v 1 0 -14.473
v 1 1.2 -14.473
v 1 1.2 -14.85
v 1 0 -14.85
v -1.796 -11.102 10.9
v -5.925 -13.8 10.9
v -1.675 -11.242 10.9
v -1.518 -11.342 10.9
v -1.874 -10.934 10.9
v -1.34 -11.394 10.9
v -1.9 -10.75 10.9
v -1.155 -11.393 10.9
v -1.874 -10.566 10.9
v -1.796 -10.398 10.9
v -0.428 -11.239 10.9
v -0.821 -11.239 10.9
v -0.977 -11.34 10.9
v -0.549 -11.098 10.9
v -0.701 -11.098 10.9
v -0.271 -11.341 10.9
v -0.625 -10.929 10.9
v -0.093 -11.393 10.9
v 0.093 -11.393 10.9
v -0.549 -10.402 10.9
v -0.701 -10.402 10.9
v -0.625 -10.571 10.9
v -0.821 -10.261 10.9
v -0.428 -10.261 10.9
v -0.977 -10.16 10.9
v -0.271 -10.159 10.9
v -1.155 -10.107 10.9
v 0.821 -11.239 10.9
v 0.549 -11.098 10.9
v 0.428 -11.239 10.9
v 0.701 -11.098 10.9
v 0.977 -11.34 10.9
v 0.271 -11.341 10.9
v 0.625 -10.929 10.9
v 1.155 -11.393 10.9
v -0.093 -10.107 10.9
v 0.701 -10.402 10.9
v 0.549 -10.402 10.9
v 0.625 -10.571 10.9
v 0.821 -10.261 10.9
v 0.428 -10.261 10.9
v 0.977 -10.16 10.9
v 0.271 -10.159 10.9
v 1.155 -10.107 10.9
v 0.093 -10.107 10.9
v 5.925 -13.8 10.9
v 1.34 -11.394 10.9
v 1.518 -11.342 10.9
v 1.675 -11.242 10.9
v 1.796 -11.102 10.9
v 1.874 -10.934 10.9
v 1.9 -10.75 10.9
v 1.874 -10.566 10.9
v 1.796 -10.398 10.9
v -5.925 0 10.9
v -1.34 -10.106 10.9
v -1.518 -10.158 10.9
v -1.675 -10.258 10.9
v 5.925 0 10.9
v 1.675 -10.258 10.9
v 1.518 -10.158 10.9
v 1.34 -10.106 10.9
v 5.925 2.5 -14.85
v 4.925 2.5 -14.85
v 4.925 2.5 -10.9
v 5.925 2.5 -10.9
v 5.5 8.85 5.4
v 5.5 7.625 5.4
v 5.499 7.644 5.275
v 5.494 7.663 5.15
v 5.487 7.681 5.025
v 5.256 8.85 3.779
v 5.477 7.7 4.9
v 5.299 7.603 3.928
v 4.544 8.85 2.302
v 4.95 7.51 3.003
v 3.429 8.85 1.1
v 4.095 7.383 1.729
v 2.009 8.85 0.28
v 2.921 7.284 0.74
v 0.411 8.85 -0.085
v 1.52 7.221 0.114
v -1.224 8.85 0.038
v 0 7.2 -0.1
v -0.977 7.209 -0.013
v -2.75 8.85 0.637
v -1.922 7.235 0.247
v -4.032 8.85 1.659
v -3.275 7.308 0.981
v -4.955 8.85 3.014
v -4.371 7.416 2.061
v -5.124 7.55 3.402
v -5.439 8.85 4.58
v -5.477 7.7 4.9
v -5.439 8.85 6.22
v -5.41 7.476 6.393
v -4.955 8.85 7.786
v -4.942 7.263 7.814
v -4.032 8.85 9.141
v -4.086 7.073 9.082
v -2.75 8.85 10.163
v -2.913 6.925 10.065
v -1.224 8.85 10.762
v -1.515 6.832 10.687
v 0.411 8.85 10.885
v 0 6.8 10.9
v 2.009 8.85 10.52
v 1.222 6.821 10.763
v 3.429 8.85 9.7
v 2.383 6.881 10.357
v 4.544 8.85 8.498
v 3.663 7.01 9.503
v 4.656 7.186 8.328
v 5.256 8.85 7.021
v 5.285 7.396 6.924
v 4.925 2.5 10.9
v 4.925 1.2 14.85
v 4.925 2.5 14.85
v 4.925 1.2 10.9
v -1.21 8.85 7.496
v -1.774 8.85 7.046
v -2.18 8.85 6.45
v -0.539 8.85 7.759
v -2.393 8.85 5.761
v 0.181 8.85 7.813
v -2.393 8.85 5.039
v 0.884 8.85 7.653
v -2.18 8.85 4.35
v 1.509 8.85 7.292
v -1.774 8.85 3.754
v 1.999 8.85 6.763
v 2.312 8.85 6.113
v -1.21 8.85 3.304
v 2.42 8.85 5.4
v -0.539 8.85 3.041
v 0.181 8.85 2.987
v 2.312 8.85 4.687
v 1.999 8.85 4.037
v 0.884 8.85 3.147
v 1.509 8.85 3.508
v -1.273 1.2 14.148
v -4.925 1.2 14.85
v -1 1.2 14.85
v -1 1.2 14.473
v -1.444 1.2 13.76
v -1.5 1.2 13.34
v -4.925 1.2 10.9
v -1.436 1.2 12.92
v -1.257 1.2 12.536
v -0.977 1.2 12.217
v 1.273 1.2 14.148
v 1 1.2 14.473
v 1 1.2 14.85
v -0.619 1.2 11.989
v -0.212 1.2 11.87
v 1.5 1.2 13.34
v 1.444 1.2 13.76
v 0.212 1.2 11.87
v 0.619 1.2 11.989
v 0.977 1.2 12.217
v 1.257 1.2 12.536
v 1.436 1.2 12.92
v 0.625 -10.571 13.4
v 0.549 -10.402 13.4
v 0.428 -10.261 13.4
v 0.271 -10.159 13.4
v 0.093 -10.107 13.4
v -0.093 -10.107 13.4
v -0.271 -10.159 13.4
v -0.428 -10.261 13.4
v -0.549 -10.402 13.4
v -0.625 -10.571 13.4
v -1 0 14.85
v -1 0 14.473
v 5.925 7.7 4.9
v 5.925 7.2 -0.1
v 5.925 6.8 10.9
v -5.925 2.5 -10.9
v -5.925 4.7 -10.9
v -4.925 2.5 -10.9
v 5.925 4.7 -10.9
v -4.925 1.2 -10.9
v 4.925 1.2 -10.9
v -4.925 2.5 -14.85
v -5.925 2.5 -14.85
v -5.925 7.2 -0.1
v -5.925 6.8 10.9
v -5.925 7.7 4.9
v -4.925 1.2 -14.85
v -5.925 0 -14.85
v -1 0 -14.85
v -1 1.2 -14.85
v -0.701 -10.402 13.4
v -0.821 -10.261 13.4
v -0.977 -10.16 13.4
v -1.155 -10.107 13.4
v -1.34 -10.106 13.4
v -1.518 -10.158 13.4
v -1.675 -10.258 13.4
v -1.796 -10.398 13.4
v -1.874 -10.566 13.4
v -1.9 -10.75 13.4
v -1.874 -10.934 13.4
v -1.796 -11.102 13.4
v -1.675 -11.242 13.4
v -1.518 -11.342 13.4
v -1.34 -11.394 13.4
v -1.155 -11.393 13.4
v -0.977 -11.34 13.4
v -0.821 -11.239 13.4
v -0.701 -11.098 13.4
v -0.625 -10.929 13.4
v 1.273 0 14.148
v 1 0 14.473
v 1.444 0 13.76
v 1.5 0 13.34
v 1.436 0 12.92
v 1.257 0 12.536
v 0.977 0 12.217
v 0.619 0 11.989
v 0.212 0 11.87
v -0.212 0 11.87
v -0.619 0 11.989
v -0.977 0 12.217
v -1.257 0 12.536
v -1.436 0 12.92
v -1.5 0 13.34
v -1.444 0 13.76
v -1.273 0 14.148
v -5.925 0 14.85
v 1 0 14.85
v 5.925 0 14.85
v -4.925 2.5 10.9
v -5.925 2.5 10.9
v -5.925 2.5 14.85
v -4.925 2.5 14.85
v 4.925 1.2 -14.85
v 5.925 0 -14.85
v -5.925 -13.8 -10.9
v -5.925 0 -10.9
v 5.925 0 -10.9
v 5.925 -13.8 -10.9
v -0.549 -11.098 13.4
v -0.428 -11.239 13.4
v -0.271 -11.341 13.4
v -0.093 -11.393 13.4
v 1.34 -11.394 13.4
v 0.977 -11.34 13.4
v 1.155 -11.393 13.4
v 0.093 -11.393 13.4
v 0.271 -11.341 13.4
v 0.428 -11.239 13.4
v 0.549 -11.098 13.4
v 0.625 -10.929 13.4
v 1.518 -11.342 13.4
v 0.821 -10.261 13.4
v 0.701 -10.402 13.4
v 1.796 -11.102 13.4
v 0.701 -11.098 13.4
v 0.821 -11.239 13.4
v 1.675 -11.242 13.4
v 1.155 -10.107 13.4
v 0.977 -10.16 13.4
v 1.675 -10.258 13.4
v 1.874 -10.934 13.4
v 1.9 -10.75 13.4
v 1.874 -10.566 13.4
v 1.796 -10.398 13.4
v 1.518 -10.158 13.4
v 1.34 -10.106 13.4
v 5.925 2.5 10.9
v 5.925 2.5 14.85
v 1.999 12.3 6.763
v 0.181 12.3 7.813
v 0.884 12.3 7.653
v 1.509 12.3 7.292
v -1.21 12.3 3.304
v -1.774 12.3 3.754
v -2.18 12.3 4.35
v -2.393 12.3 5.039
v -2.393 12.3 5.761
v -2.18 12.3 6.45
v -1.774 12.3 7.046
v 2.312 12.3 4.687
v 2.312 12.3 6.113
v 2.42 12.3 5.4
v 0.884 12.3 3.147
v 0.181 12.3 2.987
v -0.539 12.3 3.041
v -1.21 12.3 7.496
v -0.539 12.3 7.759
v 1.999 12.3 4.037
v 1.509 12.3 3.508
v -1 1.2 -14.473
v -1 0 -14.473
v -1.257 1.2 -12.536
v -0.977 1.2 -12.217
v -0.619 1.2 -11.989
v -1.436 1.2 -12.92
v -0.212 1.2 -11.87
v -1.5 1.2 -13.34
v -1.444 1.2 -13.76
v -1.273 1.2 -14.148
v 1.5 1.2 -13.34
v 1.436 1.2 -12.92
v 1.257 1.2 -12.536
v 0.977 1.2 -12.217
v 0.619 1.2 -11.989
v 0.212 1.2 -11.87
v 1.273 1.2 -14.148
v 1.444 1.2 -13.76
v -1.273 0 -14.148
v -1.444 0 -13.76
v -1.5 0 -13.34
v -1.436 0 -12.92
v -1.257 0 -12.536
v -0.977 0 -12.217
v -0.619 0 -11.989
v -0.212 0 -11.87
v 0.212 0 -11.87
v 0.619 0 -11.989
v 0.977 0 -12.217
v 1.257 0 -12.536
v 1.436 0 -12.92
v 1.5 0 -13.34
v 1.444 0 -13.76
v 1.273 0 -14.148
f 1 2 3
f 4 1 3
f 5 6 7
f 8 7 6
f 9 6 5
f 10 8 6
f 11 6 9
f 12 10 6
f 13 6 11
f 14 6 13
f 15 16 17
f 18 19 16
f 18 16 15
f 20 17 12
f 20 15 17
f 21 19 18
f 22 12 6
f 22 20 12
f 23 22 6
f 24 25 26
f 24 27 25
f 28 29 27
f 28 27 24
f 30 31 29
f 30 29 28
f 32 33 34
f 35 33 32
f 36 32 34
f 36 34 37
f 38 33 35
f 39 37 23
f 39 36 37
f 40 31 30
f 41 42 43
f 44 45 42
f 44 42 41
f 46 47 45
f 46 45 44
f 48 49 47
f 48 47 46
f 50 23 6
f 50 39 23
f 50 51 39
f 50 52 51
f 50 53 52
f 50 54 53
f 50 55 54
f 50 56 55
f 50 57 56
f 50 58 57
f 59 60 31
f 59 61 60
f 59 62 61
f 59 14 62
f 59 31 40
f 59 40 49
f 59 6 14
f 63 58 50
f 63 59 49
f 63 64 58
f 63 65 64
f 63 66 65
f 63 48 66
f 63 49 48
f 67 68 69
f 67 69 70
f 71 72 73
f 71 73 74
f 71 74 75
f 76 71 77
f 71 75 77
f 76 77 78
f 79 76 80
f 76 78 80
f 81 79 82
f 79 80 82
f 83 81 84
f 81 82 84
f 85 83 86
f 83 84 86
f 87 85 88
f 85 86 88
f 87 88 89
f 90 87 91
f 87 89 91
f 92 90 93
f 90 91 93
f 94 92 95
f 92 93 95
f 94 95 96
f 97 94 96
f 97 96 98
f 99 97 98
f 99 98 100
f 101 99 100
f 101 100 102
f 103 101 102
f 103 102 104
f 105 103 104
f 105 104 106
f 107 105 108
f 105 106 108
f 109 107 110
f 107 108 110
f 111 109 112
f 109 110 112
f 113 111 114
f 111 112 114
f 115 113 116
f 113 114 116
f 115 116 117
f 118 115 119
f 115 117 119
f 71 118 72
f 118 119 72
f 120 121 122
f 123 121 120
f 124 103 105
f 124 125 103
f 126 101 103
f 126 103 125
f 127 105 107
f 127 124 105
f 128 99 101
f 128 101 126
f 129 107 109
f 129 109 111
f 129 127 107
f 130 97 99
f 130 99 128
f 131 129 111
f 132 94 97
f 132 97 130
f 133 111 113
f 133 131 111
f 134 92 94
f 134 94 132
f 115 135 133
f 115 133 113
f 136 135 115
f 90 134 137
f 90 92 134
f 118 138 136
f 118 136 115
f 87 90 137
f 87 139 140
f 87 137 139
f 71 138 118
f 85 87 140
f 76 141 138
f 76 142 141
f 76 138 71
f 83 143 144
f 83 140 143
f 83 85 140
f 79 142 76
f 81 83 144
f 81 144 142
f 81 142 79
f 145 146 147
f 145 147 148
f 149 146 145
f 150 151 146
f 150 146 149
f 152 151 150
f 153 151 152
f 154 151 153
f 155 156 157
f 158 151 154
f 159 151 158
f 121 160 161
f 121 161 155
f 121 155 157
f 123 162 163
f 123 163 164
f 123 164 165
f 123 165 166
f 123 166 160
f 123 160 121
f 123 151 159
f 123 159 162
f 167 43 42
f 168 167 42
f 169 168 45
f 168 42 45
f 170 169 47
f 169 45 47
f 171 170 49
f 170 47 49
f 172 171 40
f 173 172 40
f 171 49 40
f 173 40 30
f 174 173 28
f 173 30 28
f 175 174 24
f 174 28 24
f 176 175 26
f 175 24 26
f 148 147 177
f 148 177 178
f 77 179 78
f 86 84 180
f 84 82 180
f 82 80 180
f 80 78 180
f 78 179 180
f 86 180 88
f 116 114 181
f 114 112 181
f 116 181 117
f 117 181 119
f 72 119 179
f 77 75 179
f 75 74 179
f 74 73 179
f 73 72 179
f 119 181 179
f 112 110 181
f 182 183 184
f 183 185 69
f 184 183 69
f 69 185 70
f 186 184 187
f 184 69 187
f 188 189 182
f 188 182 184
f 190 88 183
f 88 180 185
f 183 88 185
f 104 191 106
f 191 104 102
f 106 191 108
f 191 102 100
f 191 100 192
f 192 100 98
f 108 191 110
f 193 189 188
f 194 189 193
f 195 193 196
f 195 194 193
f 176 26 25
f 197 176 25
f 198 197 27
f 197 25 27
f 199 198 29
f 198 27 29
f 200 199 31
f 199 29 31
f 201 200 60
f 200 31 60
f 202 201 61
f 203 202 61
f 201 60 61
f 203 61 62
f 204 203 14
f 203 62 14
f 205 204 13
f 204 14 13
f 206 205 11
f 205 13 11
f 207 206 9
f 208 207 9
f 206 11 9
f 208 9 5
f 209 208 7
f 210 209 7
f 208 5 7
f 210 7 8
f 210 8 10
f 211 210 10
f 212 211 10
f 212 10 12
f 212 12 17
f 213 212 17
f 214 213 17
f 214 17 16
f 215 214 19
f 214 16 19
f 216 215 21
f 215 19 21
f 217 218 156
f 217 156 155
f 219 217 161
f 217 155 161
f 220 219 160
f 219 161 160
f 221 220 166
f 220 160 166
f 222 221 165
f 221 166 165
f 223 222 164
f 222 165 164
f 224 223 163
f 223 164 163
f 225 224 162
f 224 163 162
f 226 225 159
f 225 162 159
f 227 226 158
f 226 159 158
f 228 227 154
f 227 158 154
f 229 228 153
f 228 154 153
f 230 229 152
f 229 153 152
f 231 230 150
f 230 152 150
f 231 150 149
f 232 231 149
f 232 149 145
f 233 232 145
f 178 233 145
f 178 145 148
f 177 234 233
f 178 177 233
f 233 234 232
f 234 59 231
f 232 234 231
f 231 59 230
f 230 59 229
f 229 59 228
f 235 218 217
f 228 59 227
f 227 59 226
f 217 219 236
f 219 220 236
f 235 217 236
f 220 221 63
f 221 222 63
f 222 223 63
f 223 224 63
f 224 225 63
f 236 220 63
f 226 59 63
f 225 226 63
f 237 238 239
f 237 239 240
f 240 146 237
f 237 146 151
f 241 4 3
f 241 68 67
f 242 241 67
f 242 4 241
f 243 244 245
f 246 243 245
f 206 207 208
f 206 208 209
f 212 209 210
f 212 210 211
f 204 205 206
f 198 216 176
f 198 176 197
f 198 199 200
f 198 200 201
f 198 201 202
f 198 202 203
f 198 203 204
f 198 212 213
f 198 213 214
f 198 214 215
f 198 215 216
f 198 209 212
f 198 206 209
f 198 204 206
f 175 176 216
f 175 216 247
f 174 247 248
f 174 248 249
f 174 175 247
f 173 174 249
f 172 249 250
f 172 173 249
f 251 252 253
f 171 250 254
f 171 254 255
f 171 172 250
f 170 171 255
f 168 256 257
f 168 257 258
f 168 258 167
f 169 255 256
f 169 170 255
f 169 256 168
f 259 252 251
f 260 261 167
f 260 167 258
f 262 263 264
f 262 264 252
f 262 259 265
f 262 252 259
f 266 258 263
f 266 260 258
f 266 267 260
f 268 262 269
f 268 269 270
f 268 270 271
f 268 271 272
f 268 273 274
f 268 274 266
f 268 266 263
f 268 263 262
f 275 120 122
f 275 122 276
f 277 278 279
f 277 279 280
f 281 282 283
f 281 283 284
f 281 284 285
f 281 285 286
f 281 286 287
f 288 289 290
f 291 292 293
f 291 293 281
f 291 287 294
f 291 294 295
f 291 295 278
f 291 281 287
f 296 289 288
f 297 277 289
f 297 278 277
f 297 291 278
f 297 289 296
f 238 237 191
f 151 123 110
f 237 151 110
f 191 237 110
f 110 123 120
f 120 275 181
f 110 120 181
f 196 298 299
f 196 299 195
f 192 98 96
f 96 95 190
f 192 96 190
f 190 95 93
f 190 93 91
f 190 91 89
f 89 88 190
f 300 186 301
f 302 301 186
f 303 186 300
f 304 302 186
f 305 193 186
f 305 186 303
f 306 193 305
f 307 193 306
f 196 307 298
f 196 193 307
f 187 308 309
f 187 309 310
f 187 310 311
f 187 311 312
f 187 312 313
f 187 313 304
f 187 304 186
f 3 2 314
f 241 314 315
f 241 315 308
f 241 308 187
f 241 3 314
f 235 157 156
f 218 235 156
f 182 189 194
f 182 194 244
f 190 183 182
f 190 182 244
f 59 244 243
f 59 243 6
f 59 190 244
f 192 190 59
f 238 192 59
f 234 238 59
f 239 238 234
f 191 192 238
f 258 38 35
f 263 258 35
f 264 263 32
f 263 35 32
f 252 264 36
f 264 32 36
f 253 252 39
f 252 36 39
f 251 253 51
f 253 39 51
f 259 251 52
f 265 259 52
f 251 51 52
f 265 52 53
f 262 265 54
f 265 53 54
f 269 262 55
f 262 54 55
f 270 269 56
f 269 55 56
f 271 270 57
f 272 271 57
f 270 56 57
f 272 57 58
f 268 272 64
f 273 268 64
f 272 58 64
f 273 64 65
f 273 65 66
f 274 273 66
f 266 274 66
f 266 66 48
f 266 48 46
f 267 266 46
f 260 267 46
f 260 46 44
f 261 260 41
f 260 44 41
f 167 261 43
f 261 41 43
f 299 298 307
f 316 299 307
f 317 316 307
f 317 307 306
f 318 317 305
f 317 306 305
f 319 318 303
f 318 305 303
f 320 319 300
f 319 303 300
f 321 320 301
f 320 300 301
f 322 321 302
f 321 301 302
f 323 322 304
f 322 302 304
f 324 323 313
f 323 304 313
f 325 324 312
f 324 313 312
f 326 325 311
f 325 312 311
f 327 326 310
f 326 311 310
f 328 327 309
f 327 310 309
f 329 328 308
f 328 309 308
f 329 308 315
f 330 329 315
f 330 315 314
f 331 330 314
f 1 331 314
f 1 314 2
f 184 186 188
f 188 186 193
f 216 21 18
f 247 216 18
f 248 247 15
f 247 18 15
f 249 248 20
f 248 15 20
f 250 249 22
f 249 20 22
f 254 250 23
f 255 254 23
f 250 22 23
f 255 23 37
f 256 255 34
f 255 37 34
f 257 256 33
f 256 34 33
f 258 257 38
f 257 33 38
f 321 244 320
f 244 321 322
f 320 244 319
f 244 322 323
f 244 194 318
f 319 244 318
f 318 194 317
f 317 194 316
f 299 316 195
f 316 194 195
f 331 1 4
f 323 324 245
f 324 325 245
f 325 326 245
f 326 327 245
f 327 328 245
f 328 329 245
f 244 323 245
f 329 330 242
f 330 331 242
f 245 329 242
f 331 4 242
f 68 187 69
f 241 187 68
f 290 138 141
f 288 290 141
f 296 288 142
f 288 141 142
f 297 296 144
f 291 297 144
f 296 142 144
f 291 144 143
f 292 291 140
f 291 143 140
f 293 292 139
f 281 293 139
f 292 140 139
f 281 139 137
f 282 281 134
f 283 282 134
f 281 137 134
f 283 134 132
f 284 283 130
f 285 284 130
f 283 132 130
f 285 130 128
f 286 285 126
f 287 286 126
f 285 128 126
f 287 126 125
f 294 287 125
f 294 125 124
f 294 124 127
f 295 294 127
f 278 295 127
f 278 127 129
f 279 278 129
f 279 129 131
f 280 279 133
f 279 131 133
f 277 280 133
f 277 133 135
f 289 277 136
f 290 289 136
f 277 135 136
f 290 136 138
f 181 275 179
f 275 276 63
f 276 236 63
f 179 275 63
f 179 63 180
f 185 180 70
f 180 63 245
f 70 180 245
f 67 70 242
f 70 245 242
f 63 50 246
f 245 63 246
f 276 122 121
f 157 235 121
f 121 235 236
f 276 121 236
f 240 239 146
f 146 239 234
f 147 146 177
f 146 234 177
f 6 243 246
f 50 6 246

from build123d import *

# Parameters (mm, degrees)
SKETCH2_W           = 11.85
SKETCH2_H           = 21.8
BOSS_EXTRUDE1_DEPTH = 13.8
SKETCH3_W           = 11.85
SKETCH3_H           = 29.7
BOSS_EXTRUDE2_DEPTH = 1.2
SKETCH4_R           = 1.5
CUT_EXTRUDE11_DEPTH = 1.2
SKETCH5_W           = 2
SKETCH5_H           = 2
CUT_EXTRUDE12_DEPTH = 1.2
SKETCH6_R           = 5.5
BOSS_EXTRUDE3_DEPTH = 7.65
SKETCH7_R           = 2.42
BOSS_EXTRUDE4_DEPTH = 3.45
BOSS_EXTRUDE5_DEPTH = 11.85
SKETCH9_W           = 1
SKETCH9_H           = 3.95
BOSS_EXTRUDE6_DEPTH = 1.3
BOSS_EXTRUDE7_DEPTH = 2.5


with BuildPart() as part:
    # Sketch2 → Boss-Extrude1 (new body)
    with BuildSketch(Plane(origin=(0, 0, 0), x_dir=(1, 0, 0), z_dir=(0, 1, 0))):
        Rectangle(SKETCH2_W, SKETCH2_H)
    extrude(amount=-BOSS_EXTRUDE1_DEPTH)

    # Sketch3 → Boss-Extrude2 (add)
    with BuildSketch(Plane(origin=(0, 0, 0), x_dir=(1, 0, 0), z_dir=(0, 1, 0))):
        Rectangle(SKETCH3_W, SKETCH3_H)
    extrude(amount=BOSS_EXTRUDE2_DEPTH)

    # Sketch4 → Cut-Extrude11 (cut)
    with BuildSketch(Plane(origin=(0, 1.2, 0), x_dir=(1, 0, 0), z_dir=(0, 1, 0))):
        with Locations((0, 13.355)):
            Circle(SKETCH4_R)
        with Locations((0, -13.355)):
            Circle(SKETCH4_R)
    extrude(amount=-CUT_EXTRUDE11_DEPTH, mode=Mode.SUBTRACT)

    # Sketch5 → Cut-Extrude12 (cut)
    with BuildSketch(Plane(origin=(0, 1.2, 0), x_dir=(1, 0, 0), z_dir=(0, 1, 0))):
        with Locations((0, 14.85)):
            Rectangle(SKETCH5_W, SKETCH5_H)
        with Locations((0, -14.85)):
            Rectangle(SKETCH5_W, SKETCH5_H)
    extrude(amount=-CUT_EXTRUDE12_DEPTH, mode=Mode.SUBTRACT)

    # Sketch6 → Boss-Extrude3 (add)
    with BuildSketch(Plane(origin=(0, 1.2, 0), x_dir=(1, 0, 0), z_dir=(0, 1, 0))):
        with Locations((0, -5.4)):
            Circle(SKETCH6_R)
    extrude(amount=BOSS_EXTRUDE3_DEPTH)

    # Sketch7 → Boss-Extrude4 (add)
    with BuildSketch(Plane(origin=(0, 8.85, 0), x_dir=(1, 0, 0), z_dir=(0, 1, 0))):
        with Locations((0, -5.4)):
            Circle(SKETCH7_R)
    extrude(amount=BOSS_EXTRUDE4_DEPTH)

    # Sketch8 → Boss-Extrude5 (add)
    with BuildSketch(Plane(origin=(5.925, 0, 0), x_dir=(0, 0, -1), z_dir=(1, 0, 0))):
        Polygon((-10.9, 1.2), (-10.9, 6.8), (-4.9, 7.7), (0.1, 7.2), (10.9, 4.7), (10.9, 1.2), align=None)
    extrude(amount=-BOSS_EXTRUDE5_DEPTH)

    # Sketch9 → Boss-Extrude6 (add)
    with BuildSketch(Plane(origin=(0, 1.2, 0), x_dir=(1, 0, 0), z_dir=(0, 1, 0))):
        with Locations((5.425, -12.875)):
            Rectangle(SKETCH9_W, SKETCH9_H)
        with Locations((-5.425, -12.875)):
            Rectangle(SKETCH9_W, SKETCH9_H)
        with Locations((-5.425, 12.875)):
            Rectangle(SKETCH9_W, SKETCH9_H)
        with Locations((5.425, 12.875)):
            Rectangle(SKETCH9_W, SKETCH9_H)
    extrude(amount=BOSS_EXTRUDE6_DEPTH)

    # Sketch10 → Boss-Extrude7 (add)
    with BuildSketch(Plane.XY.offset(10.9)):
        with BuildLine():
            ThreePointArc((-0.625, -10.928535711), (0, -11.4), (0.625, -10.928535711))
            ThreePointArc((0.625, -10.928535711), (1.9, -10.75), (0.625, -10.571464289))
            ThreePointArc((0.625, -10.571464289), (0, -10.1), (-0.625, -10.571464289))
            ThreePointArc((-0.625, -10.571464289), (-1.9, -10.75), (-0.625, -10.928535711))
        make_face()
    extrude(amount=BOSS_EXTRUDE7_DEPTH)


solid = part.part
